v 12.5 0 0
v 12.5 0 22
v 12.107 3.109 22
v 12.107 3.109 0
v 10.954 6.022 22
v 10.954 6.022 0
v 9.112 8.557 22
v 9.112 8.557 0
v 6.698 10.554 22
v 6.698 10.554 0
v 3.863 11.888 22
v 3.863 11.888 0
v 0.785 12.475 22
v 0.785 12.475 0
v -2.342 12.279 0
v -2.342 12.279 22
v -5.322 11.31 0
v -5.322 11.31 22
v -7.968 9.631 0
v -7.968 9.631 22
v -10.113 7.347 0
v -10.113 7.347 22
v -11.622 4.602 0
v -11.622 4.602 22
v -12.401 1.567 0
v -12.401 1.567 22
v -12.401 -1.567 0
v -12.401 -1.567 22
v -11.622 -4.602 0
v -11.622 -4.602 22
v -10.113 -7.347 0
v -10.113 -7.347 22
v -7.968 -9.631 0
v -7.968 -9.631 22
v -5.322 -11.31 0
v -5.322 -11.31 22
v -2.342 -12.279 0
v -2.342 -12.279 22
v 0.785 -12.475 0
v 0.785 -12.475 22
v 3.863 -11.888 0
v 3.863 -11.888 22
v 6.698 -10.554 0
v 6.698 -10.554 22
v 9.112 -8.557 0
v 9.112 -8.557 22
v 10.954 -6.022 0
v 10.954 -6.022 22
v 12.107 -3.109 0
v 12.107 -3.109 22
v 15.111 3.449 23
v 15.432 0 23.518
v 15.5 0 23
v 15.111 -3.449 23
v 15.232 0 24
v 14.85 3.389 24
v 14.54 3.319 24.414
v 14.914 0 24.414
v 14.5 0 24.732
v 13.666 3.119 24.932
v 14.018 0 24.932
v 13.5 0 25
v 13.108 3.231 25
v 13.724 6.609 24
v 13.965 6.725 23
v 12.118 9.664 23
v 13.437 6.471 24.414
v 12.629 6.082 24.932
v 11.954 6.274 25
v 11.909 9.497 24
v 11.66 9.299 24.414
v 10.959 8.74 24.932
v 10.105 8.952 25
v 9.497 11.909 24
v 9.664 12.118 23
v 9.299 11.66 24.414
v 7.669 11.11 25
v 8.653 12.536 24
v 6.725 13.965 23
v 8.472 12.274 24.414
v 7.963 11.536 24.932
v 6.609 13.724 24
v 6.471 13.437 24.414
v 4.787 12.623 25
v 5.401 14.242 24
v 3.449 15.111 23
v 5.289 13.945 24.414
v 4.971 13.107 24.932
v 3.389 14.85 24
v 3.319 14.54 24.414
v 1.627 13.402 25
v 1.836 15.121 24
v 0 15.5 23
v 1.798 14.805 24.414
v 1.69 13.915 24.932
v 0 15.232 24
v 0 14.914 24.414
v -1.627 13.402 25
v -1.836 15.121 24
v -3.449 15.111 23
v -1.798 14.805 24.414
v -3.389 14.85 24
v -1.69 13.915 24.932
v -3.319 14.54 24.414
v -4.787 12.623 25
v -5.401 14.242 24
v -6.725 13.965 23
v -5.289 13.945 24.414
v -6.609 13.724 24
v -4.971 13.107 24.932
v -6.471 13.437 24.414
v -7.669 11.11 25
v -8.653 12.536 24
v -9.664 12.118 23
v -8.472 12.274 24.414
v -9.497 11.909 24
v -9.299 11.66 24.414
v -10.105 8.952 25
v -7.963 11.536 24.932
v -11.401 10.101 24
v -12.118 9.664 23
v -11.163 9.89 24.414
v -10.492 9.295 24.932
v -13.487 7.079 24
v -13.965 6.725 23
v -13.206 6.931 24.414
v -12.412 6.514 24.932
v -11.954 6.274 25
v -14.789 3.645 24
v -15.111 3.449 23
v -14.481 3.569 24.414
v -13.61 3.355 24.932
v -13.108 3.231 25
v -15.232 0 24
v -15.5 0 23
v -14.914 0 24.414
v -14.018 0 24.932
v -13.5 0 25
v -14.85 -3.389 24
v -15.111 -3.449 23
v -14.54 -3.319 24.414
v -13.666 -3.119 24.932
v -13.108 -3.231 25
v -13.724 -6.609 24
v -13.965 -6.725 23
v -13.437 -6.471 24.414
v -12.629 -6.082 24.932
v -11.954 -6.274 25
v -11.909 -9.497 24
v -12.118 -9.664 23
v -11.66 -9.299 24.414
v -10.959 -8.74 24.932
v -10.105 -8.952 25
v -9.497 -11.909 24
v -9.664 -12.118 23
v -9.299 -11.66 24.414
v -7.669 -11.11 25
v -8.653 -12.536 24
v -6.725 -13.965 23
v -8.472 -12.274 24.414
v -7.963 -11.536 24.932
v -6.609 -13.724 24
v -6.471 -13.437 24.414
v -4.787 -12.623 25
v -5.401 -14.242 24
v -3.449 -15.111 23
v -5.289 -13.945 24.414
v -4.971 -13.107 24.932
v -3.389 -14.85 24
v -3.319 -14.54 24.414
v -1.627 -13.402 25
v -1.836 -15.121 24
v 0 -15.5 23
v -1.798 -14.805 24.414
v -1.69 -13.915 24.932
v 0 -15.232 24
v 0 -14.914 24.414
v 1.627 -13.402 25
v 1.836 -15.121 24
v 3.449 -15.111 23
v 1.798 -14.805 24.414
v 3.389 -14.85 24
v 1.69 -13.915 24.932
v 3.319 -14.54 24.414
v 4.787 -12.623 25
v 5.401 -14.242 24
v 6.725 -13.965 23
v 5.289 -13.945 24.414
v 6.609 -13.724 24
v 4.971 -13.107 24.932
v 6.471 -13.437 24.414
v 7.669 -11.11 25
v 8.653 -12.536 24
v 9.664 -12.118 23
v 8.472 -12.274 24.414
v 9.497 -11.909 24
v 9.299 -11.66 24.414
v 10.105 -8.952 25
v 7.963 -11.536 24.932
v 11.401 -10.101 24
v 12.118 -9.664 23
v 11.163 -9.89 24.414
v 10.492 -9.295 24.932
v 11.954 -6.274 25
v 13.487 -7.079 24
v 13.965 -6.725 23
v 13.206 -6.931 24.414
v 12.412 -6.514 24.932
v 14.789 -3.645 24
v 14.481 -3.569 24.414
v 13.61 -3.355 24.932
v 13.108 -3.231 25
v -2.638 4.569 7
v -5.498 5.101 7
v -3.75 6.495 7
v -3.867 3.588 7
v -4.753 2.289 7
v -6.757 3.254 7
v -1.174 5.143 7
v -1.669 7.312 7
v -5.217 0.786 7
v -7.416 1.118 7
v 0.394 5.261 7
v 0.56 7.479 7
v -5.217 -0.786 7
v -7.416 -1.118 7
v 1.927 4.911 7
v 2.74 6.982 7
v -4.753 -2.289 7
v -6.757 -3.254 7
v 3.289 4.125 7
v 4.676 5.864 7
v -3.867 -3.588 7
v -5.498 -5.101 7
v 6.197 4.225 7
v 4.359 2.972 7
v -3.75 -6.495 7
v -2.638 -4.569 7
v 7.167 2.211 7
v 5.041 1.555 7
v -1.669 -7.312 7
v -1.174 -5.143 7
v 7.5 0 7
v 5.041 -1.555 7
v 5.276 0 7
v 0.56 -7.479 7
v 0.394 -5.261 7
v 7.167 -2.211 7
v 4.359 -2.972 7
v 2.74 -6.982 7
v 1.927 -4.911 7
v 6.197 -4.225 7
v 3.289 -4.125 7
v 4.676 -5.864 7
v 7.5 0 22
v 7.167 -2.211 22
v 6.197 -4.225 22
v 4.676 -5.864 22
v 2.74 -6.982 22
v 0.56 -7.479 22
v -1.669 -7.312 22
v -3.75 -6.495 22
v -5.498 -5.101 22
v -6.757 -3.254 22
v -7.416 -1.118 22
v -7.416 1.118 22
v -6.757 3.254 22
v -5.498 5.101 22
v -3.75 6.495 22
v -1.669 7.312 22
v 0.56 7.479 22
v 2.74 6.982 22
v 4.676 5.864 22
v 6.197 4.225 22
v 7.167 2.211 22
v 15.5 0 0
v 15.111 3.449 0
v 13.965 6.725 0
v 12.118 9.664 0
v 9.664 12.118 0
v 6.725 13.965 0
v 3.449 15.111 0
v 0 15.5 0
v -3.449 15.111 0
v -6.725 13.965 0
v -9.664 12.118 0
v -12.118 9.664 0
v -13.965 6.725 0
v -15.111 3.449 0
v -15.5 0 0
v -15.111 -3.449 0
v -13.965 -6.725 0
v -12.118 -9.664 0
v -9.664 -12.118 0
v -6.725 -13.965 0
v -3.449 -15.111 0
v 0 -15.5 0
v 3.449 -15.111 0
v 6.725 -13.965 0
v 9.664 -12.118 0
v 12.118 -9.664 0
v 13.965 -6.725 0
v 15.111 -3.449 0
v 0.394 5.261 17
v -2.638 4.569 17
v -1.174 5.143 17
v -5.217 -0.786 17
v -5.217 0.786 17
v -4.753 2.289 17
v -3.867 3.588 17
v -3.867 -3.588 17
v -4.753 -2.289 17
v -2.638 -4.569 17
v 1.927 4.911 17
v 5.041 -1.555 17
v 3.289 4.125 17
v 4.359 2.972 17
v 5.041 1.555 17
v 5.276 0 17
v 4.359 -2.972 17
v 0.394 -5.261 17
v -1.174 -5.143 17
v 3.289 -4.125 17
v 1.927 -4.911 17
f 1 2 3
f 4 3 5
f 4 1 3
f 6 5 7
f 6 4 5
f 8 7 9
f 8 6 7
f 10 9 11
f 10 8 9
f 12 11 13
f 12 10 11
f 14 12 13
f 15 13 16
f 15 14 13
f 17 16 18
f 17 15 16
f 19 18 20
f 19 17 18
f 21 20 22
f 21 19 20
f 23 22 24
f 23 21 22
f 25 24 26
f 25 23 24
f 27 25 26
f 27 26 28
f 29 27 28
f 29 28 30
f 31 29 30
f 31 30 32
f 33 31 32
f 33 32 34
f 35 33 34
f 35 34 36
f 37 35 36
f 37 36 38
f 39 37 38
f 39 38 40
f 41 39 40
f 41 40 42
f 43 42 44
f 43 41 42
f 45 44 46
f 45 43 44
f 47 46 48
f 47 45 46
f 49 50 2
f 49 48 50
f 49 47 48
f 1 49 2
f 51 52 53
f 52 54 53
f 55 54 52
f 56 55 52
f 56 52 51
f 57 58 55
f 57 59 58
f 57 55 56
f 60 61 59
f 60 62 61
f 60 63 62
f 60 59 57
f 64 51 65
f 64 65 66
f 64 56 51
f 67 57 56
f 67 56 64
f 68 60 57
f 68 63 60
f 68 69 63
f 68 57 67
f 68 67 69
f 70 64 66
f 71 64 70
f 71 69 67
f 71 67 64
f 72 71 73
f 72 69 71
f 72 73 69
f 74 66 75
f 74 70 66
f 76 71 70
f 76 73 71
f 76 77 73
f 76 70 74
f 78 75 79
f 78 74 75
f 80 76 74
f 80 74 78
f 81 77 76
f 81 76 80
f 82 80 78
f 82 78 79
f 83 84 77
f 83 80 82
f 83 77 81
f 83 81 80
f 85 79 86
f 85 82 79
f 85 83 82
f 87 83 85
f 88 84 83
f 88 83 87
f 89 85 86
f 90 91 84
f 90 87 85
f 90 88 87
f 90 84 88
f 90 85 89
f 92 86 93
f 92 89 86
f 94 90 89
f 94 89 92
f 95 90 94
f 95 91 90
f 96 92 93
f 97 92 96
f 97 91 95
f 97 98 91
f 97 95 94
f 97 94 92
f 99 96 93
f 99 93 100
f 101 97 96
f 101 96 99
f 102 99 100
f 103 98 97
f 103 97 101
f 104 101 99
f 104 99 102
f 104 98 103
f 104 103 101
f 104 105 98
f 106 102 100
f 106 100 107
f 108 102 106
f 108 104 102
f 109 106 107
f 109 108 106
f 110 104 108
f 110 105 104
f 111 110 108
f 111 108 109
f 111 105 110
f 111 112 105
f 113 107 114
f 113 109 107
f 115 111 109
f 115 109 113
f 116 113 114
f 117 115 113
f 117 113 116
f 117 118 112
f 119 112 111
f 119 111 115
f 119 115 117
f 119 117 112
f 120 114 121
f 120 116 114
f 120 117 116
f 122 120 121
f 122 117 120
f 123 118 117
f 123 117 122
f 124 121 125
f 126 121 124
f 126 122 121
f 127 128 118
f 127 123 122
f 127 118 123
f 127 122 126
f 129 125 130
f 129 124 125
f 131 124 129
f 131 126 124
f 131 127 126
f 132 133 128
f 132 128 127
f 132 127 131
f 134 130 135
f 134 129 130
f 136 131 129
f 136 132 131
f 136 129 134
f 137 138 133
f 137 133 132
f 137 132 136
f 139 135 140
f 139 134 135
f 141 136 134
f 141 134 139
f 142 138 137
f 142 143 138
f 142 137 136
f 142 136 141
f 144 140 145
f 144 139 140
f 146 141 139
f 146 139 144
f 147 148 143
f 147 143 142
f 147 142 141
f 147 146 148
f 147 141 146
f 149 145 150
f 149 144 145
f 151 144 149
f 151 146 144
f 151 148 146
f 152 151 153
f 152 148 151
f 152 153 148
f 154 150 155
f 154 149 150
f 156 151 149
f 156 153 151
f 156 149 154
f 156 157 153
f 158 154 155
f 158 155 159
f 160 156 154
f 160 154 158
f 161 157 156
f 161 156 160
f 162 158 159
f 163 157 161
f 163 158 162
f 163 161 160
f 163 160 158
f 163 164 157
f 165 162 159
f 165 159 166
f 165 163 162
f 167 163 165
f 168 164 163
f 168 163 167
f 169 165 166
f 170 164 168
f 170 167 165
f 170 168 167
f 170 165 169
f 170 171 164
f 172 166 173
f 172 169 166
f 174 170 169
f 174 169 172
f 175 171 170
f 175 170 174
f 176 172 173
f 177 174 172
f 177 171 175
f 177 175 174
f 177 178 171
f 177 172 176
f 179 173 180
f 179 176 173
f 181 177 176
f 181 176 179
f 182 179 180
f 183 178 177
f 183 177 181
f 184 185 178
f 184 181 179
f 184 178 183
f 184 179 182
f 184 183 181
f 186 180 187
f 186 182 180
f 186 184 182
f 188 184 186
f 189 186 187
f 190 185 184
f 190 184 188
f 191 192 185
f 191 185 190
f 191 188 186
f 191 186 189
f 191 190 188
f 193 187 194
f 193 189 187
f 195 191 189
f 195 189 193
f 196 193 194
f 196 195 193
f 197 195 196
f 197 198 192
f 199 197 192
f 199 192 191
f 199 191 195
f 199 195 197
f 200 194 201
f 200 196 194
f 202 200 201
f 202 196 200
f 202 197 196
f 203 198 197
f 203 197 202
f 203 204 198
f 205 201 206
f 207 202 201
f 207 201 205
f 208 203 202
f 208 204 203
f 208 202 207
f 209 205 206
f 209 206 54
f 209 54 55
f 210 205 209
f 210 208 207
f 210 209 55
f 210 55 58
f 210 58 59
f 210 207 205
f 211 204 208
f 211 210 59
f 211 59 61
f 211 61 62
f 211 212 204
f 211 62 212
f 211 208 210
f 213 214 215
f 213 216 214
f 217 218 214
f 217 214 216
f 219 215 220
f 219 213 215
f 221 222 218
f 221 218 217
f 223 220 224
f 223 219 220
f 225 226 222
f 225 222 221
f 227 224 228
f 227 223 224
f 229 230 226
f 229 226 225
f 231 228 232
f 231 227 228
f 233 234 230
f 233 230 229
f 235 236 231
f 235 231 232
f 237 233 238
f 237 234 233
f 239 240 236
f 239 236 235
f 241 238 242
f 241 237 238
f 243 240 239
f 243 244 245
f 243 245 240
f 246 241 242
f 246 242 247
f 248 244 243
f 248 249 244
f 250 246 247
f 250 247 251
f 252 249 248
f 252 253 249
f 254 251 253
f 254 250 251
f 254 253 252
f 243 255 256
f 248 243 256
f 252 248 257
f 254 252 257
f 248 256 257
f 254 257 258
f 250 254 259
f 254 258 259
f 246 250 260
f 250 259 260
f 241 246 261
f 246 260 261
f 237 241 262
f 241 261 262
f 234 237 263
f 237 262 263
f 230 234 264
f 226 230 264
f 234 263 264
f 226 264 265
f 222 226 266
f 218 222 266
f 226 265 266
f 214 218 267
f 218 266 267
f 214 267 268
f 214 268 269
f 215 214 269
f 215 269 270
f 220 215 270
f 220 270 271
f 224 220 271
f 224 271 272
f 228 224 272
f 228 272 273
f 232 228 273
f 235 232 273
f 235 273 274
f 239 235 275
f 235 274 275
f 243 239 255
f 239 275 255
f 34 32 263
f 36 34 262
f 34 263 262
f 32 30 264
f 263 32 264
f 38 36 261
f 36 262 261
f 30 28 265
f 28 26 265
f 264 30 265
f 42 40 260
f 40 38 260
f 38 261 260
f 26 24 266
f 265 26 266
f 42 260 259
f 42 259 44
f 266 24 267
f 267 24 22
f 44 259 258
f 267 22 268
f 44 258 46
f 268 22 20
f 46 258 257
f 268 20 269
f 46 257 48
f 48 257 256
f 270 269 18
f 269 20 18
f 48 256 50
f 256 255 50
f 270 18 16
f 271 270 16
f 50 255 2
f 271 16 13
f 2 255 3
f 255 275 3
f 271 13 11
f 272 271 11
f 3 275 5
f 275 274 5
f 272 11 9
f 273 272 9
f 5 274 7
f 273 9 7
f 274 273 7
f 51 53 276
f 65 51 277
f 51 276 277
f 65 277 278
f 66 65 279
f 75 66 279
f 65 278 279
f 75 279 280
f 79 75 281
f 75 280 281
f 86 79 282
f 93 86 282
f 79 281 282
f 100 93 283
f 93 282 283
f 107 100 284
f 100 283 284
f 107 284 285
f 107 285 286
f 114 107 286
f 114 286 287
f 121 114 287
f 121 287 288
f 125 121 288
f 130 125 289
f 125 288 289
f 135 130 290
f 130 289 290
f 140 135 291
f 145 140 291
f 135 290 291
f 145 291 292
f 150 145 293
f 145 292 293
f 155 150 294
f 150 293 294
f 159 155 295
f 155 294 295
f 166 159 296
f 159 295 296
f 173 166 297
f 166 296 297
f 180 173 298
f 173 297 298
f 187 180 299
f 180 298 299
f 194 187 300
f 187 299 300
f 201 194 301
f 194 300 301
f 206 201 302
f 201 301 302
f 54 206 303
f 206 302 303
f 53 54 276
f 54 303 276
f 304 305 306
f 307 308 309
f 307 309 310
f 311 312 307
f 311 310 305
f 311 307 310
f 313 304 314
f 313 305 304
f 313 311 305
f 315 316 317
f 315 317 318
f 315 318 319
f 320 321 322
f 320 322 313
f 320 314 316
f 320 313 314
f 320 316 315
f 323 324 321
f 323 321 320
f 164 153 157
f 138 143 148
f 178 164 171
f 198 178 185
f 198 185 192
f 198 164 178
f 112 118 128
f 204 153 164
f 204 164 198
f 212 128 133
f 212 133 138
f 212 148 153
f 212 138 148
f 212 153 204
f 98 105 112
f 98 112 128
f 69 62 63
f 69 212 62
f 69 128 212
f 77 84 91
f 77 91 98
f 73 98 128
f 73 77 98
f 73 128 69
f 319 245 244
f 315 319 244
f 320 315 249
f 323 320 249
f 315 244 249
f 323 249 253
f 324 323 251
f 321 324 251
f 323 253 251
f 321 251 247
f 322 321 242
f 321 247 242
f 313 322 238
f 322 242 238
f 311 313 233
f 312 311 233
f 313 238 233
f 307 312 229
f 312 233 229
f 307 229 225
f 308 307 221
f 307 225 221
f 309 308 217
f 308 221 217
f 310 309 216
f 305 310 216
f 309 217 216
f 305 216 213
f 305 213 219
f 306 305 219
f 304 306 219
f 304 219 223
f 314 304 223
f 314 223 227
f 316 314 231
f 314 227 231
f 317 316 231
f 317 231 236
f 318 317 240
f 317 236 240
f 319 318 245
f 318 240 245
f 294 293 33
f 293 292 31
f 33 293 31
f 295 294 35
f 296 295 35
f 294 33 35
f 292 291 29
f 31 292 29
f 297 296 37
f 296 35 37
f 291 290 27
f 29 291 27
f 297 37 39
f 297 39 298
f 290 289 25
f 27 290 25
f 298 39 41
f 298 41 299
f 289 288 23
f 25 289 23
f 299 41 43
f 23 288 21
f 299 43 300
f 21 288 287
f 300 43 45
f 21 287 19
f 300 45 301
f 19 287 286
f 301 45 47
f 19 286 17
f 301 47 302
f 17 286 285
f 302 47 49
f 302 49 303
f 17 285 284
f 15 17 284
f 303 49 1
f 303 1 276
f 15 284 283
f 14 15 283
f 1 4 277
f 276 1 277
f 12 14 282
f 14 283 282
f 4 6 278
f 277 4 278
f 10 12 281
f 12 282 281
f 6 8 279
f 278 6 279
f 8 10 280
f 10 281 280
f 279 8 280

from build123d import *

# Parameters (mm, degrees)
F0_R     = 15.5
F1_DEPTH = 25
F2_T     = -3
F3_R     = 2
F4_R     = 7.5
F5_DEPTH = 15
F6_R     = 5.275719
F7_DEPTH = 10


with BuildPart() as f1:
    # F0 (on Top) → F1 (new body)
    with BuildSketch(Plane.XY):
        Circle(F0_R)
    extrude(amount=F1_DEPTH)

    # F2
    f2_openings = [f1.faces().sort_by_distance(p)[0] for p in [
        (0, 0, 0),
    ]]
    offset(amount=F2_T, openings=f2_openings)

    # F3
    f3_edges = [f1.edges().sort_by_distance(p)[0] for p in [
        (-15.5, 0, 25),
    ]]
    fillet(f3_edges, radius=F3_R)

    # F4 (on face) → F5 (join)
    with BuildSketch(Plane(origin=(0, 0, 22), x_dir=(1, 0, 0), z_dir=(0, 0, -1))):
        Circle(F4_R)
    extrude(amount=F5_DEPTH)

    # F6 (on face) → F7 (cut)
    with BuildSketch(Plane(origin=(0, 0, 7), x_dir=(1, 0, 0), z_dir=(0, 0, -1))):
        Circle(F6_R)
    extrude(amount=-F7_DEPTH, mode=Mode.SUBTRACT)


solid = f1.part
